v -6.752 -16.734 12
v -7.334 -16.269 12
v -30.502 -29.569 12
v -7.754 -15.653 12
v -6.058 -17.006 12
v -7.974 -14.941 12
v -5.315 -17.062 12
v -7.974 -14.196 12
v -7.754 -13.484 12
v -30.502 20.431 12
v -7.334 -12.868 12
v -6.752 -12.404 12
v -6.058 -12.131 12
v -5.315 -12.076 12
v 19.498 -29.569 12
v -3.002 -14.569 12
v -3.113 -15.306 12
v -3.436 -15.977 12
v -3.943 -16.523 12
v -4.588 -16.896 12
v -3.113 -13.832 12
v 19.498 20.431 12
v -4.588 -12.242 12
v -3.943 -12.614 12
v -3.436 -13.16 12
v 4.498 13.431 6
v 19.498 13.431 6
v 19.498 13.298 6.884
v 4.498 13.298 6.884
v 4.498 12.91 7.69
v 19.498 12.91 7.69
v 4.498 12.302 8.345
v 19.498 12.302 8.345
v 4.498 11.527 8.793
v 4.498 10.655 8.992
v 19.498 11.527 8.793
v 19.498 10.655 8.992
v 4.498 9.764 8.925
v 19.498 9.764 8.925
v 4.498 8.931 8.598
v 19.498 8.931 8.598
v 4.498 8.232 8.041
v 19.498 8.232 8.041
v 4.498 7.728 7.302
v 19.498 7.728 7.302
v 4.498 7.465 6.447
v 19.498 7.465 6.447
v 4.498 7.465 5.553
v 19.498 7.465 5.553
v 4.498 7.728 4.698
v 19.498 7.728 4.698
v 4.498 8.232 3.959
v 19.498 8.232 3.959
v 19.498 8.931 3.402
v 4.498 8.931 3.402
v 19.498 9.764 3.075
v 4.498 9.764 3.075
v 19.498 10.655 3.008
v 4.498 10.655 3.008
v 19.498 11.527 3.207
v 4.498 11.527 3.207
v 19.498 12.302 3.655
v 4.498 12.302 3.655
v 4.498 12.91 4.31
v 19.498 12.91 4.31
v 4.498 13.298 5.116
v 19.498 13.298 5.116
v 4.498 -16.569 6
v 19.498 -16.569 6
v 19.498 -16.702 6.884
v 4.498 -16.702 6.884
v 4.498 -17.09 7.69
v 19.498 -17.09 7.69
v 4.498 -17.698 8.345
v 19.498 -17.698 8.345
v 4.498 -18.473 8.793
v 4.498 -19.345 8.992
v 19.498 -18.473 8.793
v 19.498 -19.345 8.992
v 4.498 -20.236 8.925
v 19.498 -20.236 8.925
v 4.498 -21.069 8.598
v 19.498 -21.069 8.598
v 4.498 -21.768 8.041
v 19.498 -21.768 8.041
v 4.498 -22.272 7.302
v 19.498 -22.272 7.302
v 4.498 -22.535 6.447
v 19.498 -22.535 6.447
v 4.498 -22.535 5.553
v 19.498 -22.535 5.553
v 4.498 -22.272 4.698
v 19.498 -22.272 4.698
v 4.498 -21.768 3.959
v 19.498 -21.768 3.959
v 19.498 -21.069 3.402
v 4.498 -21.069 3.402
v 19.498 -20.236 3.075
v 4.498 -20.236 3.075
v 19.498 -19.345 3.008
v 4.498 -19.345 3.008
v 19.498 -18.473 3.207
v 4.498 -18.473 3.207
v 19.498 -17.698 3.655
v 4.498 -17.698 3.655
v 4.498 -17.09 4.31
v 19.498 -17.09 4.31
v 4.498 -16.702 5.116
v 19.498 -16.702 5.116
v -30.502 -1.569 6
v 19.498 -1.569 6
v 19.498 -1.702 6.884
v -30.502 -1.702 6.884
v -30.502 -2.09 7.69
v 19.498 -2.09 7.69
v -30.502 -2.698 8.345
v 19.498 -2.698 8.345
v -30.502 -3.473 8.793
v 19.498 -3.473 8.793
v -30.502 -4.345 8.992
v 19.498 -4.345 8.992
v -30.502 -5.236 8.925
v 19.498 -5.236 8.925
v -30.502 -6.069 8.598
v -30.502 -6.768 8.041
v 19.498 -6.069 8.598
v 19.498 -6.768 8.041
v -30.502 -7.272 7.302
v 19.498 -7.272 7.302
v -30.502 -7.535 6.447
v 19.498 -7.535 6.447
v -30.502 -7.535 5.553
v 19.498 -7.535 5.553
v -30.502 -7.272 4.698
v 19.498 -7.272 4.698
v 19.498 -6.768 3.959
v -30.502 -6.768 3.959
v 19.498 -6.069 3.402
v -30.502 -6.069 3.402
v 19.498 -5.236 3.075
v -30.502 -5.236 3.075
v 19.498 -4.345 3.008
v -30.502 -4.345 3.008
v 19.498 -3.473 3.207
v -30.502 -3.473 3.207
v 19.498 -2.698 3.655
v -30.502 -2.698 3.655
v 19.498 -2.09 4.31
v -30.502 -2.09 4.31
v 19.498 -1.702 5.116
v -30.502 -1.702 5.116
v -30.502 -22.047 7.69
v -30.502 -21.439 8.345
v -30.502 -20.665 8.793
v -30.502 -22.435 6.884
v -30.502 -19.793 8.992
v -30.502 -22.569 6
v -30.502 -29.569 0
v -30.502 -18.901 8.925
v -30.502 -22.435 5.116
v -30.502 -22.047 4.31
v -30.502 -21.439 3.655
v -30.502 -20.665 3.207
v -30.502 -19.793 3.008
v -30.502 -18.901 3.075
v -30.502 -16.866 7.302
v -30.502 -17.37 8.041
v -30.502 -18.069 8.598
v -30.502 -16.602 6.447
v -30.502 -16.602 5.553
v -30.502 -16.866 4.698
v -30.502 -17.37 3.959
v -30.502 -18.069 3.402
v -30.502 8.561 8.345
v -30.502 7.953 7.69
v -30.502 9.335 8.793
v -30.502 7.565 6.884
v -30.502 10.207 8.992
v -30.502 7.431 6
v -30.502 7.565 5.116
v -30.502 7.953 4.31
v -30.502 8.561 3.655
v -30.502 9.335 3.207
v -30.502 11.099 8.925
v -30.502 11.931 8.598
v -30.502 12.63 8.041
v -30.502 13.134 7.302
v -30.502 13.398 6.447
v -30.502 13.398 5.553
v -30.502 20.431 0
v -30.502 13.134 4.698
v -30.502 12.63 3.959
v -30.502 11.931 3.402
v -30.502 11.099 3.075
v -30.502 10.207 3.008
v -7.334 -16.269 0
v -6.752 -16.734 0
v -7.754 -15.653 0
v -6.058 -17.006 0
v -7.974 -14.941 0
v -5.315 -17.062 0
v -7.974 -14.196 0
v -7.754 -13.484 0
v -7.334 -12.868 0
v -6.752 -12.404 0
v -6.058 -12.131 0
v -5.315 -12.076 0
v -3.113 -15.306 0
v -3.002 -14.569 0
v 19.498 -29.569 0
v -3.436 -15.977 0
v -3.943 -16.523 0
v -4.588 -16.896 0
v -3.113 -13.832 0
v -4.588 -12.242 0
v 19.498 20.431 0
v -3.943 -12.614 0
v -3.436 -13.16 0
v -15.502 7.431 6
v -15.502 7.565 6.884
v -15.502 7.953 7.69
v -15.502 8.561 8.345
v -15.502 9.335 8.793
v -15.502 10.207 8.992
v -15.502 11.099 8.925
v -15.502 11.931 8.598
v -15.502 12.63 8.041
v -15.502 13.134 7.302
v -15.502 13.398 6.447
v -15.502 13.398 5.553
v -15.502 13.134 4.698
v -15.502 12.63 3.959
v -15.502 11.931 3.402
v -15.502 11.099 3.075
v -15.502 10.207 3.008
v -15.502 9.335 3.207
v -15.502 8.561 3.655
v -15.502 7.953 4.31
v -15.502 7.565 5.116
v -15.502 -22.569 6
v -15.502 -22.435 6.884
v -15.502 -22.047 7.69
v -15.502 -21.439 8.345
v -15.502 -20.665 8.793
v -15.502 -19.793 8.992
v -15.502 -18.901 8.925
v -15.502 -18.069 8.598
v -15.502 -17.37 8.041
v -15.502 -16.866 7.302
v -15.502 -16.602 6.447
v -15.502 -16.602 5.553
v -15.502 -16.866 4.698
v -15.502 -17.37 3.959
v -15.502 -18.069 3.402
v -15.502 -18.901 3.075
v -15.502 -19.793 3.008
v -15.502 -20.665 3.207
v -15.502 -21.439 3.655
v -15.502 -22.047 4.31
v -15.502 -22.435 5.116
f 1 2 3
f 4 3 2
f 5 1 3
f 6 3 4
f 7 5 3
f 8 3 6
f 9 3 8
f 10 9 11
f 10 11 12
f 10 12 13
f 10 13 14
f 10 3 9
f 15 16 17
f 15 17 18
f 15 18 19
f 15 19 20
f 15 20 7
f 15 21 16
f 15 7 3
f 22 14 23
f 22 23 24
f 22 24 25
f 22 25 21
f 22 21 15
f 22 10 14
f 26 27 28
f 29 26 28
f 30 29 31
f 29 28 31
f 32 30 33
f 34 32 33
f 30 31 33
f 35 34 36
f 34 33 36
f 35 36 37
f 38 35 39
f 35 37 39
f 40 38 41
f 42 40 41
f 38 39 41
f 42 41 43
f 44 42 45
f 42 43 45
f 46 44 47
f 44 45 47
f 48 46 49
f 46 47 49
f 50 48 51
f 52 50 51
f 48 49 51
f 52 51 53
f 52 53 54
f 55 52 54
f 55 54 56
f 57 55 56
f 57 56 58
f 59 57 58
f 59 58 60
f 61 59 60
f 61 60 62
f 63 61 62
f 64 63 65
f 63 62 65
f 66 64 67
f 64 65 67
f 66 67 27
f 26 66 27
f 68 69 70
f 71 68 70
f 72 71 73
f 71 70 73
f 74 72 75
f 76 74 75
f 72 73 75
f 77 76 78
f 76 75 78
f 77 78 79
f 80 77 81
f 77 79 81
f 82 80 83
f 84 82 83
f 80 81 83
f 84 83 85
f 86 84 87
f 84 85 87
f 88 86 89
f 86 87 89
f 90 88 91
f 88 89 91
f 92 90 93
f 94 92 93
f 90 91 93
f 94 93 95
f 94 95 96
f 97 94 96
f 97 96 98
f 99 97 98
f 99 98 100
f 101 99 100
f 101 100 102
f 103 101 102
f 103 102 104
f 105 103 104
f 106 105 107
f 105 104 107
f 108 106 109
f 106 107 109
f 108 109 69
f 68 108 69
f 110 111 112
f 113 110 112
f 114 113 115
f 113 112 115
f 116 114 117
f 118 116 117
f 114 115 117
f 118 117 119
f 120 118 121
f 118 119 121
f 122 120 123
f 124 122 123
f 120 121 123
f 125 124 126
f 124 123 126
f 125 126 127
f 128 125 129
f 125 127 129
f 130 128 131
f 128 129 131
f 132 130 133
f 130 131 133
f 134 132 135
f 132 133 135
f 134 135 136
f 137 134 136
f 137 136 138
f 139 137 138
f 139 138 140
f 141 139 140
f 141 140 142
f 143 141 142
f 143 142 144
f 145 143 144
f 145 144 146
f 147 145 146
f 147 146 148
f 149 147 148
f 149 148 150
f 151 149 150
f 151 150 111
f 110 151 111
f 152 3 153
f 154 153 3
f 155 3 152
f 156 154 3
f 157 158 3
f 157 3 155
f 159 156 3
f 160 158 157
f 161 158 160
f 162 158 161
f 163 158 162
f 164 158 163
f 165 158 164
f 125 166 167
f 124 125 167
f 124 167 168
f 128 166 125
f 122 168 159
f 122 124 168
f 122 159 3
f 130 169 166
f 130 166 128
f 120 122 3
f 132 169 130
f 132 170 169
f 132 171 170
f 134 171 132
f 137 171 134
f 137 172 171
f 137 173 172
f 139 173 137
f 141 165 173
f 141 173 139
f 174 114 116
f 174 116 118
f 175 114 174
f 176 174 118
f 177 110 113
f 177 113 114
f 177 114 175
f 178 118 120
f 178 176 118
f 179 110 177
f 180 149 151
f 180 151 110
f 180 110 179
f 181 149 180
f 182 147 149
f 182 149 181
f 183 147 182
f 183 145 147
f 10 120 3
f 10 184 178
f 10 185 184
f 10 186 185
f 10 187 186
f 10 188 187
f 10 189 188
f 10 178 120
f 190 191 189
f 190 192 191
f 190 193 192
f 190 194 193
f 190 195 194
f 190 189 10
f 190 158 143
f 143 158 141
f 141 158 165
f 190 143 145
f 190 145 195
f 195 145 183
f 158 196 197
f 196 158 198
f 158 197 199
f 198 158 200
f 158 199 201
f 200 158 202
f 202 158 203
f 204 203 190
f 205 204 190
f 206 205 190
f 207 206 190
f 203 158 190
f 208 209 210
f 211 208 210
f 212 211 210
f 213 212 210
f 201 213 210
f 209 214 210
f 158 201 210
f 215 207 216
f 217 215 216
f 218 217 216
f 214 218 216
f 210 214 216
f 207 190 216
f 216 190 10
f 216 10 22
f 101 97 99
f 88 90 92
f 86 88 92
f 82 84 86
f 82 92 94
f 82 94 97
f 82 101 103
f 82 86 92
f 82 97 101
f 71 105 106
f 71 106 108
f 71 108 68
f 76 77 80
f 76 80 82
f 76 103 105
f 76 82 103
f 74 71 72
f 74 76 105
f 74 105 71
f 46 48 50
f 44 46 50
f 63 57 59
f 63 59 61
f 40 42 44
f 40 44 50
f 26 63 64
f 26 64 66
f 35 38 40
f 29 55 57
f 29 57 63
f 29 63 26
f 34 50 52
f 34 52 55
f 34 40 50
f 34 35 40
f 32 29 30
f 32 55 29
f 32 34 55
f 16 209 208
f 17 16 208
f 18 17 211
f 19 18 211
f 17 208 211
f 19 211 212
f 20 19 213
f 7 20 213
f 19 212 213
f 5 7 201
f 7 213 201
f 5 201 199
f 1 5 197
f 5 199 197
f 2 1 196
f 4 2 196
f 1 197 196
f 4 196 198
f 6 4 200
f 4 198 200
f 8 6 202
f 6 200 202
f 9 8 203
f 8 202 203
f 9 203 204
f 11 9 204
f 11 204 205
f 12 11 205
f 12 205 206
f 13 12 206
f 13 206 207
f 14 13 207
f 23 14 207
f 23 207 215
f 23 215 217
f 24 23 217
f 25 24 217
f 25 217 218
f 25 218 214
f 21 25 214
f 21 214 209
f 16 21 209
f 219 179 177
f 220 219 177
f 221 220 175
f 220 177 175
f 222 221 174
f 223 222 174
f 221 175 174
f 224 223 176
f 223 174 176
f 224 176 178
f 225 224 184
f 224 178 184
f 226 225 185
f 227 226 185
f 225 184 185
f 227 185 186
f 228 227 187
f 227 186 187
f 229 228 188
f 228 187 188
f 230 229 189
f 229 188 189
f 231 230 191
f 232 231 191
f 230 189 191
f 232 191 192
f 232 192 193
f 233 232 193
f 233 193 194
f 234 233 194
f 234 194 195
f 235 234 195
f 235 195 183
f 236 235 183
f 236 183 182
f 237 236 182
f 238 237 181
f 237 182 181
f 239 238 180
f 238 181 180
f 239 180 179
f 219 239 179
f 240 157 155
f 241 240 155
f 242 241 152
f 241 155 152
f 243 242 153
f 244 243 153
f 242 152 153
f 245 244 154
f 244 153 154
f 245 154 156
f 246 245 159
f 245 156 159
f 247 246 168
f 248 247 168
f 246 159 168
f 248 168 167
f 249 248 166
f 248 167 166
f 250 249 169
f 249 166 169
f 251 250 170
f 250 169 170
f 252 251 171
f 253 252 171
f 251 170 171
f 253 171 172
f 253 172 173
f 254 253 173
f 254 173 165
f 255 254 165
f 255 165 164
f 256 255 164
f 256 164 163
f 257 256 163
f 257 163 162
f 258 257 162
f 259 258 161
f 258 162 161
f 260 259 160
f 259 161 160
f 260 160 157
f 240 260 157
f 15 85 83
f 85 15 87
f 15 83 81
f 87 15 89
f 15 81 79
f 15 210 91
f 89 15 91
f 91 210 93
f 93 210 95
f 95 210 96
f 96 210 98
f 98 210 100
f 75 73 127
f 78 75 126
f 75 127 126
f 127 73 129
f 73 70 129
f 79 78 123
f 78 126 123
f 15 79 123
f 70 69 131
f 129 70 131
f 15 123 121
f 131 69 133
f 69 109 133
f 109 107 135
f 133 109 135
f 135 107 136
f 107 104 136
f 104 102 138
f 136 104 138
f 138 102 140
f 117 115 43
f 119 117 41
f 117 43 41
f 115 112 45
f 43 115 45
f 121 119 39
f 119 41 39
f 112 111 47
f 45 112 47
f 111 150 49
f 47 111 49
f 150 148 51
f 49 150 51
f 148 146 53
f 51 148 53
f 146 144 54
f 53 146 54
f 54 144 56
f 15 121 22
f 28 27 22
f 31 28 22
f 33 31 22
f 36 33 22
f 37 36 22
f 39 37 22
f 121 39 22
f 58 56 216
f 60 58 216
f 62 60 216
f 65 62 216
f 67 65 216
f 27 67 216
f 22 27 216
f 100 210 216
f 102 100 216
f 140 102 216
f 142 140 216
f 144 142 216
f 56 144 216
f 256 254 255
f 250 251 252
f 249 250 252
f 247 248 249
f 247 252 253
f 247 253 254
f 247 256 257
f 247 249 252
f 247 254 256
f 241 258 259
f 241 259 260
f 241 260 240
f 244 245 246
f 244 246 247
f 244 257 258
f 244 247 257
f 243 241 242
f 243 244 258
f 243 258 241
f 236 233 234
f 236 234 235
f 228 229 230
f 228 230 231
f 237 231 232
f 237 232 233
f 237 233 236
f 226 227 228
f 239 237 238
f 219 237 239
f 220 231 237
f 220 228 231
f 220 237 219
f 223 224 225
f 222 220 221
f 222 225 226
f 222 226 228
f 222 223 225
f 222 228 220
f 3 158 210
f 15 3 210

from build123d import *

# Parameters (mm, degrees)
F0_W     = 50
F0_H     = 50
F1_DEPTH = 12
F2_R     = 3
F3_DEPTH = 15
F4_R     = 3
F5_DEPTH = 15
F6_R     = 3
F7_DEPTH = 50.001
F8_R     = 2.5
F9_DEPTH = 12.001


with BuildPart() as f1:
    # F0 (on Top) → F1 (new body)
    with BuildSketch(Plane.XY):
        with Locations((-5.501713, -4.568746)):
            Rectangle(F0_W, F0_H)
    extrude(amount=F1_DEPTH)

    # F2 (on face) → F3 (cut)
    with BuildSketch(Plane(origin=(-30.501713, 0, 0), x_dir=(0, -1, 0), z_dir=(-1, 0, 0))):
        with Locations((-10.431254, 6)):
            Circle(F2_R)
        with Locations((19.568746, 6)):
            Circle(F2_R)
    extrude(amount=-F3_DEPTH, mode=Mode.SUBTRACT)

    # F4 (on face) → F5 (cut)
    with BuildSketch(Plane.YZ.offset(19.498287)):
        with Locations((10.431254, 6)):
            Circle(F4_R)
        with Locations((-19.568746, 6)):
            Circle(F4_R)
    extrude(amount=-F5_DEPTH, mode=Mode.SUBTRACT)

    # F6 (on face) → F7 (cut, through all)
    with BuildSketch(Plane.YZ.offset(19.498287)):
        with Locations((-4.568746, 6)):
            Circle(F6_R)
    extrude(amount=-F7_DEPTH, mode=Mode.SUBTRACT)

    # F8 (on face) → F9 (cut, through all)
    with BuildSketch(Plane(origin=(0, 0, 0), x_dir=(1, 0, 0), z_dir=(0, 0, -1))):
        with Locations((-5.501713, 14.568746)):
            Circle(F8_R)
    extrude(amount=-F9_DEPTH, mode=Mode.SUBTRACT)


solid = f1.part
